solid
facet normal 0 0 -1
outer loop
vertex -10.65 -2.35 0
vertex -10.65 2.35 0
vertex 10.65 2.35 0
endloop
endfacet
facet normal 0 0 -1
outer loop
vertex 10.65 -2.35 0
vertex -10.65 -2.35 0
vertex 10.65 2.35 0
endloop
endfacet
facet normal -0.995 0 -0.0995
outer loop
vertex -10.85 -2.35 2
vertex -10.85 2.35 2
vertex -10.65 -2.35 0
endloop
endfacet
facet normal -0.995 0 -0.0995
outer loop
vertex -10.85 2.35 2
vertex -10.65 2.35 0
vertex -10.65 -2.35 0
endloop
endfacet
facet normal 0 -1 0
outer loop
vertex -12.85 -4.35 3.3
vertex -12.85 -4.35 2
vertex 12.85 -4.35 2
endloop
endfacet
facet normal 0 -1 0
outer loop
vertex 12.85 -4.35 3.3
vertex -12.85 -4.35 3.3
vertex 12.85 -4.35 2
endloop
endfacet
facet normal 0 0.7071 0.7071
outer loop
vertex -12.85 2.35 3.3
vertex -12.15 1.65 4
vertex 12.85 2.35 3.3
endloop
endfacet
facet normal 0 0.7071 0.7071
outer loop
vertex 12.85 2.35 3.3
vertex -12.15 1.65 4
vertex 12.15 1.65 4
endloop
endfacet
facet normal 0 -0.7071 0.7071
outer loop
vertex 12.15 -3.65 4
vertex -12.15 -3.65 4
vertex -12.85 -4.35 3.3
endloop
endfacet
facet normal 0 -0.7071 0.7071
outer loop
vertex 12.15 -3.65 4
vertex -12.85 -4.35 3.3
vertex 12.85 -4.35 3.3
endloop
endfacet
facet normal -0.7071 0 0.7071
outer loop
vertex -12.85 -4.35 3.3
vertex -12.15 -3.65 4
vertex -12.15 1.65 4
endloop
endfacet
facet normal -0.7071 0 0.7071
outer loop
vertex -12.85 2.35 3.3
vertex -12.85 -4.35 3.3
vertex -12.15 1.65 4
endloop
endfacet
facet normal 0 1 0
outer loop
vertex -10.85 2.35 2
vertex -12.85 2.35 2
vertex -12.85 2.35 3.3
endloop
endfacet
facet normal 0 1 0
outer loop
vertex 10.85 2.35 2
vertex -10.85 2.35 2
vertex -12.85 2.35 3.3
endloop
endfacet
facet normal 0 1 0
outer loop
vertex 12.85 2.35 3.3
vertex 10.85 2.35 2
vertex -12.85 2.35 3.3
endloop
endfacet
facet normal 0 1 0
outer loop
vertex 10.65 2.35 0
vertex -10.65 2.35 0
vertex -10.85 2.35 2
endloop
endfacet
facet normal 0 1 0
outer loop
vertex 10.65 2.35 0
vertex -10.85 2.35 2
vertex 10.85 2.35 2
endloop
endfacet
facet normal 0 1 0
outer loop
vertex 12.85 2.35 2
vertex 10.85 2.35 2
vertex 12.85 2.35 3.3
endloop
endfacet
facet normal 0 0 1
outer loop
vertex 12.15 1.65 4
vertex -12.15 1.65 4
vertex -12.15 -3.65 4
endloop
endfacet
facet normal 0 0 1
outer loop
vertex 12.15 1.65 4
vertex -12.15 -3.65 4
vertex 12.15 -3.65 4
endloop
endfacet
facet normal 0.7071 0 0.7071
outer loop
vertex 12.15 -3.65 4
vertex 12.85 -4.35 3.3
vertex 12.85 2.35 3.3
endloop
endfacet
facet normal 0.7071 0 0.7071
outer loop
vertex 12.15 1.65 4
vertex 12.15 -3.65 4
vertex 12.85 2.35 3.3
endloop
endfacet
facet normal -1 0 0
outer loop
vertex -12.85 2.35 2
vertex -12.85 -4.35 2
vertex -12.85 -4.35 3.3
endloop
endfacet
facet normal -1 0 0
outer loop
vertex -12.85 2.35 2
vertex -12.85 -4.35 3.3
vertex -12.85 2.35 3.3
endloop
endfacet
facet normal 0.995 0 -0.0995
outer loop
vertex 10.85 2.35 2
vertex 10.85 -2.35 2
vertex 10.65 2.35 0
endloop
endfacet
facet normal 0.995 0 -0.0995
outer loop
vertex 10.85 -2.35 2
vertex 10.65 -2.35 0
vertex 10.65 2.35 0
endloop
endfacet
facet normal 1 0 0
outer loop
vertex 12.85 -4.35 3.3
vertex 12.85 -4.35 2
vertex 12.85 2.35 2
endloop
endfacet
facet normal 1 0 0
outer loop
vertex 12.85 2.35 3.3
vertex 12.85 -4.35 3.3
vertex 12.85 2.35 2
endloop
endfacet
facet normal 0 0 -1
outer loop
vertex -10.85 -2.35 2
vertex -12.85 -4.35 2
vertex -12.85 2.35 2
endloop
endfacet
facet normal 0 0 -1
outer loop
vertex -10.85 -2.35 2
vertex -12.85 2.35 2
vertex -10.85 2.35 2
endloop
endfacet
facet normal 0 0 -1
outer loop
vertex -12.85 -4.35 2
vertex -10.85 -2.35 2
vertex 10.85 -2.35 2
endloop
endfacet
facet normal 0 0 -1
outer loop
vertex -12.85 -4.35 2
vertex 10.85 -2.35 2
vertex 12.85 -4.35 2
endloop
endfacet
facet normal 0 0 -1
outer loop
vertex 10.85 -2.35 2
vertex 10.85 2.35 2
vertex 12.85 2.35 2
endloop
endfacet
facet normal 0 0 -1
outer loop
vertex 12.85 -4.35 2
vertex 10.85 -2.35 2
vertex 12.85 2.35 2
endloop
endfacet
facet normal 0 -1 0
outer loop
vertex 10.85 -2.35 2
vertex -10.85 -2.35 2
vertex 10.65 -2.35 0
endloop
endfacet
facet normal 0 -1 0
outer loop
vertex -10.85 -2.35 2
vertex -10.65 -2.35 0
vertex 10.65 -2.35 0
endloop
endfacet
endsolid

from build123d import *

# Parameters (mm, degrees)
SKETCH2_W           = 21.7
SKETCH2_H           = 4.7
SKETCH1_W           = 21.3
SKETCH1_H           = 4.7
SKETCH3_W           = 25.7
SKETCH3_H           = 6.7
BOSS_EXTRUDE1_DEPTH = 2
CHAMFER1_SIZE       = 0.7


with BuildPart() as part:
    # Sketch2 → Loft1 section 0
    with BuildSketch(Plane.XY.offset(2)):
        Rectangle(SKETCH2_W, SKETCH2_H)
    # Sketch1 → Loft1 section 1
    with BuildSketch(Plane.XY):
        Rectangle(SKETCH1_W, SKETCH1_H)
    loft()

    # Sketch3 → Boss-Extrude1 (add)
    with BuildSketch(Plane.XY.offset(2)):
        with Locations((0, -1)):
            Rectangle(SKETCH3_W, SKETCH3_H)
    extrude(amount=BOSS_EXTRUDE1_DEPTH)

    # Chamfer1
    chamfer1_edges = [part.edges().sort_by_distance(p)[0] for p in [
        (-12.85, -1, 4),
        (0, -4.35, 4),
        (12.85, -1, 4),
        (0, 2.35, 4),
    ]]
    chamfer(chamfer1_edges, length=CHAMFER1_SIZE)


solid = part.part
